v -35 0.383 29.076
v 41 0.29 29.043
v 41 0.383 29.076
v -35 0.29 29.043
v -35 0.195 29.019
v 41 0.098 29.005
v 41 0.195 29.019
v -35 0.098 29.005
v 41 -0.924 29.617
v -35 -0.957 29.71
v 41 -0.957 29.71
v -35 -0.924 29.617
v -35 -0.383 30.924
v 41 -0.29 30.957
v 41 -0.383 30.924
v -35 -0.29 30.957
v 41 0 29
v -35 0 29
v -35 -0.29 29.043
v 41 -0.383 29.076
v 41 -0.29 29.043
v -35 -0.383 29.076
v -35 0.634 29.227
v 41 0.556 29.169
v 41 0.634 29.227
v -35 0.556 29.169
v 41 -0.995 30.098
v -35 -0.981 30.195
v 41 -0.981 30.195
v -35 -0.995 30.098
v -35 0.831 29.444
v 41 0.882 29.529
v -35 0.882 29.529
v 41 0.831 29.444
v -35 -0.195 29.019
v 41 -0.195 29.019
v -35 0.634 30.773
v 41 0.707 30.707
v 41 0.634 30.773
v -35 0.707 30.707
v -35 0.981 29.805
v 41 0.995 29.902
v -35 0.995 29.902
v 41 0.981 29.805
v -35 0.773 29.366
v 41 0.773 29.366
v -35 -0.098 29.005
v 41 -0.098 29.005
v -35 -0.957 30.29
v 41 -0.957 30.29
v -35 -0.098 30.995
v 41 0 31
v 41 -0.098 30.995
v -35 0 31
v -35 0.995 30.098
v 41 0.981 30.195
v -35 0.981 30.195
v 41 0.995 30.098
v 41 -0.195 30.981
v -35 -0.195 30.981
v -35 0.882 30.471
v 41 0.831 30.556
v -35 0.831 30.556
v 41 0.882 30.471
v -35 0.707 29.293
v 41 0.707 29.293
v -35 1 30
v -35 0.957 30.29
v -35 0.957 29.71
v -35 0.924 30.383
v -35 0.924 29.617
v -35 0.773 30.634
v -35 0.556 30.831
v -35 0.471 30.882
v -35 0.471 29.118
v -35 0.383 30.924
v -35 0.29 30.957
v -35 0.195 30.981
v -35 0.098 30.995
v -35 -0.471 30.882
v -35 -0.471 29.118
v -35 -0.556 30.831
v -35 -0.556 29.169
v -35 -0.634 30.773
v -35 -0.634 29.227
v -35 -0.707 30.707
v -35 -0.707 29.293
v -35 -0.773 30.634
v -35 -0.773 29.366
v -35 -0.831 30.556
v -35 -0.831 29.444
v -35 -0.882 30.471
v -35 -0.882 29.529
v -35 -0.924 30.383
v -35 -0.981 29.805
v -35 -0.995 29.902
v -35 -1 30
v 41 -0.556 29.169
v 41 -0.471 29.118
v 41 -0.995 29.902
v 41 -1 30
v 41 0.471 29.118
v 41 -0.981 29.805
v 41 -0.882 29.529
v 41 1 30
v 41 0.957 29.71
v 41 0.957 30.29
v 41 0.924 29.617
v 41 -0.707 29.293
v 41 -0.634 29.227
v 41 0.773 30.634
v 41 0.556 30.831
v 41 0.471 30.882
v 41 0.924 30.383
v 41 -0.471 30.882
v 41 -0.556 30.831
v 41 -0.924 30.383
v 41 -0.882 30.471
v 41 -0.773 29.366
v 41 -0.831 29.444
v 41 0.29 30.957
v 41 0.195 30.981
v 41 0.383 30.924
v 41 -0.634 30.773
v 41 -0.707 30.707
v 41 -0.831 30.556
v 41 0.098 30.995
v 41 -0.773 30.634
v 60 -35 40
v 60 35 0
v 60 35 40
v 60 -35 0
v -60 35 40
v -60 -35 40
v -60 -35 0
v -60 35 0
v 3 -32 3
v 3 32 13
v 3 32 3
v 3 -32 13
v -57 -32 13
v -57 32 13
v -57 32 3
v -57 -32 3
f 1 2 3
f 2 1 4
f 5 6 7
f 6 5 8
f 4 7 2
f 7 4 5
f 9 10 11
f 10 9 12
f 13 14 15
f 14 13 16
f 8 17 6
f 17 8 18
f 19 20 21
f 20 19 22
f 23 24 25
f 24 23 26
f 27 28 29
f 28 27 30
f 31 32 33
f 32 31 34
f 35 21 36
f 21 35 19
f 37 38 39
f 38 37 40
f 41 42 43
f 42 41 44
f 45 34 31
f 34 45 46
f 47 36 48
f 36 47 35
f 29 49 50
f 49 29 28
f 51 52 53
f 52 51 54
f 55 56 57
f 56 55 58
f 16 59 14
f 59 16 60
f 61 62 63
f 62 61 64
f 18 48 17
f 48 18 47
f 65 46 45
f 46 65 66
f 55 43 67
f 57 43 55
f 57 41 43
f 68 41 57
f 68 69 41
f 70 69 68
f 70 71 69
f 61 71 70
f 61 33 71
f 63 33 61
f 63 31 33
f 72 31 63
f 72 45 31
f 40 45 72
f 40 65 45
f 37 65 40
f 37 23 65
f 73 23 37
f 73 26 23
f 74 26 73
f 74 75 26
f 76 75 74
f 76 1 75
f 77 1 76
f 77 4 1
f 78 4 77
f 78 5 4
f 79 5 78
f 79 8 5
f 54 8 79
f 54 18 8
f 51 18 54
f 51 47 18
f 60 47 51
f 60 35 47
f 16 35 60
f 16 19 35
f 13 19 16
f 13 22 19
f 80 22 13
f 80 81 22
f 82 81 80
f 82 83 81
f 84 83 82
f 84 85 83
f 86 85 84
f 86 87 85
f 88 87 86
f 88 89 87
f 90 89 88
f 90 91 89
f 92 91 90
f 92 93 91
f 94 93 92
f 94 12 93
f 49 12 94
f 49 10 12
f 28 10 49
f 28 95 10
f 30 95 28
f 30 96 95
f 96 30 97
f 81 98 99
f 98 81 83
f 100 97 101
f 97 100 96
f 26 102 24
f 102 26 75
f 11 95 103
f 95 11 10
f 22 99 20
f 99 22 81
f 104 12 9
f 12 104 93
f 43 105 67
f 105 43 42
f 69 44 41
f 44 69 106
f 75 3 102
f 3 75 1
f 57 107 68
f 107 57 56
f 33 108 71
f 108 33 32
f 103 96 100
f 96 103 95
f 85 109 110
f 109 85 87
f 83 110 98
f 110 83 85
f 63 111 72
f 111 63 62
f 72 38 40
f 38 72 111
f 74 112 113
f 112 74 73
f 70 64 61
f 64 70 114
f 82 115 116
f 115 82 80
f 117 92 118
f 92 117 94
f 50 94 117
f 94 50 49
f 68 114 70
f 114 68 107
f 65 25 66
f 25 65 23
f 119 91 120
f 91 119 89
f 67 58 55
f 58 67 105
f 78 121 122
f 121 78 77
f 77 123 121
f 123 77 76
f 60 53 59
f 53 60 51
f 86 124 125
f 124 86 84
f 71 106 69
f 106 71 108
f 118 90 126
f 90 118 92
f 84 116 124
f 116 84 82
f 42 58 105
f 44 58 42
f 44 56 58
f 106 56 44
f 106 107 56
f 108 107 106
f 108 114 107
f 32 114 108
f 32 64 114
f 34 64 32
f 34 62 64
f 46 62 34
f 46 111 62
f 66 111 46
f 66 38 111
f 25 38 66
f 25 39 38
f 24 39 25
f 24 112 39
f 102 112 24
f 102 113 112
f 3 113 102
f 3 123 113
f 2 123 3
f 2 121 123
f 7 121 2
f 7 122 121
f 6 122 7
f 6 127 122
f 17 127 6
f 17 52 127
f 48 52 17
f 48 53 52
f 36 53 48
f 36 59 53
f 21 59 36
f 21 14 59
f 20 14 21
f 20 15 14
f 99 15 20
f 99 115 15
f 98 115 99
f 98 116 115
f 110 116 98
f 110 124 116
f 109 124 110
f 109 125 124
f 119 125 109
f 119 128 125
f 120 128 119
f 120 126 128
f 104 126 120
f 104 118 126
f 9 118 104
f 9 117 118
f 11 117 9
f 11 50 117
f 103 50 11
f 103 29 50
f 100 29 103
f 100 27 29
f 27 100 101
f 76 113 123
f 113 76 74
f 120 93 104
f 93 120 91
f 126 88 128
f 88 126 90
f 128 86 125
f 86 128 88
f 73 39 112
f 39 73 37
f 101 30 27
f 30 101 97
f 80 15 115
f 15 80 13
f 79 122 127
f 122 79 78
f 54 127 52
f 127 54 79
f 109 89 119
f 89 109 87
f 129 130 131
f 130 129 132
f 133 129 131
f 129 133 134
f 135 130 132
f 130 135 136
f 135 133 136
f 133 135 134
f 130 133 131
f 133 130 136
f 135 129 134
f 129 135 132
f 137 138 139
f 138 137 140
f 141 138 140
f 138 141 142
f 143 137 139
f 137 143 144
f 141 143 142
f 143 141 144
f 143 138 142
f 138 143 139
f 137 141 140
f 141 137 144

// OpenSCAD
// Mini horizontal gel-electrophoresis buffer tank
// Print orientation: base on XY plane, builds up +Z

$fn = 64;

// ---- Tank dimensions ----
tank_x = 120;   // outer length (X)
tank_y = 70;    // outer width (Y)
tank_z = 40;    // outer height (Z)

// ---- Wall thickness ----
wall = 3;       // side wall thickness (X and Y)
floor = 3;      // floor thickness (Z)

// ---- Platform dimensions ----
plat_len = 60;  // platform length along X
plat_top_z = 13; // platform top height (z = floor + 10)

// ---- Hole dimensions ----
hole_d = 2;     // electrode wire hole diameter
hole_y = 0;     // hole Y position
hole_z = 30;    // hole Z position

// ---- Derived ----
inner_x = tank_x - 2 * wall;   // 114
inner_y = tank_y - 2 * wall;   // 64
inner_floor_z = floor;         // 3
platform_h = plat_top_z - inner_floor_z; // 10

difference() {
    // Tank body (open top)
    translate([-tank_x / 2, -tank_y / 2, 0])
        cube([tank_x, tank_y, tank_z]);

    // Raised platform in the middle (full inner width)
    translate([-inner_x / 2, -inner_y / 2, inner_floor_z])
        cube([plat_len, inner_y, platform_h]);

    // Horizontal electrode holes through each end wall along X
    for (sx = [-1, 1])
        translate([sx > 0 ? wall : -tank_x + wall, hole_y, hole_z])
            rotate([0, 90, 0])
                cylinder(d = hole_d, h = tank_y + 2 * wall, center = true);
}
